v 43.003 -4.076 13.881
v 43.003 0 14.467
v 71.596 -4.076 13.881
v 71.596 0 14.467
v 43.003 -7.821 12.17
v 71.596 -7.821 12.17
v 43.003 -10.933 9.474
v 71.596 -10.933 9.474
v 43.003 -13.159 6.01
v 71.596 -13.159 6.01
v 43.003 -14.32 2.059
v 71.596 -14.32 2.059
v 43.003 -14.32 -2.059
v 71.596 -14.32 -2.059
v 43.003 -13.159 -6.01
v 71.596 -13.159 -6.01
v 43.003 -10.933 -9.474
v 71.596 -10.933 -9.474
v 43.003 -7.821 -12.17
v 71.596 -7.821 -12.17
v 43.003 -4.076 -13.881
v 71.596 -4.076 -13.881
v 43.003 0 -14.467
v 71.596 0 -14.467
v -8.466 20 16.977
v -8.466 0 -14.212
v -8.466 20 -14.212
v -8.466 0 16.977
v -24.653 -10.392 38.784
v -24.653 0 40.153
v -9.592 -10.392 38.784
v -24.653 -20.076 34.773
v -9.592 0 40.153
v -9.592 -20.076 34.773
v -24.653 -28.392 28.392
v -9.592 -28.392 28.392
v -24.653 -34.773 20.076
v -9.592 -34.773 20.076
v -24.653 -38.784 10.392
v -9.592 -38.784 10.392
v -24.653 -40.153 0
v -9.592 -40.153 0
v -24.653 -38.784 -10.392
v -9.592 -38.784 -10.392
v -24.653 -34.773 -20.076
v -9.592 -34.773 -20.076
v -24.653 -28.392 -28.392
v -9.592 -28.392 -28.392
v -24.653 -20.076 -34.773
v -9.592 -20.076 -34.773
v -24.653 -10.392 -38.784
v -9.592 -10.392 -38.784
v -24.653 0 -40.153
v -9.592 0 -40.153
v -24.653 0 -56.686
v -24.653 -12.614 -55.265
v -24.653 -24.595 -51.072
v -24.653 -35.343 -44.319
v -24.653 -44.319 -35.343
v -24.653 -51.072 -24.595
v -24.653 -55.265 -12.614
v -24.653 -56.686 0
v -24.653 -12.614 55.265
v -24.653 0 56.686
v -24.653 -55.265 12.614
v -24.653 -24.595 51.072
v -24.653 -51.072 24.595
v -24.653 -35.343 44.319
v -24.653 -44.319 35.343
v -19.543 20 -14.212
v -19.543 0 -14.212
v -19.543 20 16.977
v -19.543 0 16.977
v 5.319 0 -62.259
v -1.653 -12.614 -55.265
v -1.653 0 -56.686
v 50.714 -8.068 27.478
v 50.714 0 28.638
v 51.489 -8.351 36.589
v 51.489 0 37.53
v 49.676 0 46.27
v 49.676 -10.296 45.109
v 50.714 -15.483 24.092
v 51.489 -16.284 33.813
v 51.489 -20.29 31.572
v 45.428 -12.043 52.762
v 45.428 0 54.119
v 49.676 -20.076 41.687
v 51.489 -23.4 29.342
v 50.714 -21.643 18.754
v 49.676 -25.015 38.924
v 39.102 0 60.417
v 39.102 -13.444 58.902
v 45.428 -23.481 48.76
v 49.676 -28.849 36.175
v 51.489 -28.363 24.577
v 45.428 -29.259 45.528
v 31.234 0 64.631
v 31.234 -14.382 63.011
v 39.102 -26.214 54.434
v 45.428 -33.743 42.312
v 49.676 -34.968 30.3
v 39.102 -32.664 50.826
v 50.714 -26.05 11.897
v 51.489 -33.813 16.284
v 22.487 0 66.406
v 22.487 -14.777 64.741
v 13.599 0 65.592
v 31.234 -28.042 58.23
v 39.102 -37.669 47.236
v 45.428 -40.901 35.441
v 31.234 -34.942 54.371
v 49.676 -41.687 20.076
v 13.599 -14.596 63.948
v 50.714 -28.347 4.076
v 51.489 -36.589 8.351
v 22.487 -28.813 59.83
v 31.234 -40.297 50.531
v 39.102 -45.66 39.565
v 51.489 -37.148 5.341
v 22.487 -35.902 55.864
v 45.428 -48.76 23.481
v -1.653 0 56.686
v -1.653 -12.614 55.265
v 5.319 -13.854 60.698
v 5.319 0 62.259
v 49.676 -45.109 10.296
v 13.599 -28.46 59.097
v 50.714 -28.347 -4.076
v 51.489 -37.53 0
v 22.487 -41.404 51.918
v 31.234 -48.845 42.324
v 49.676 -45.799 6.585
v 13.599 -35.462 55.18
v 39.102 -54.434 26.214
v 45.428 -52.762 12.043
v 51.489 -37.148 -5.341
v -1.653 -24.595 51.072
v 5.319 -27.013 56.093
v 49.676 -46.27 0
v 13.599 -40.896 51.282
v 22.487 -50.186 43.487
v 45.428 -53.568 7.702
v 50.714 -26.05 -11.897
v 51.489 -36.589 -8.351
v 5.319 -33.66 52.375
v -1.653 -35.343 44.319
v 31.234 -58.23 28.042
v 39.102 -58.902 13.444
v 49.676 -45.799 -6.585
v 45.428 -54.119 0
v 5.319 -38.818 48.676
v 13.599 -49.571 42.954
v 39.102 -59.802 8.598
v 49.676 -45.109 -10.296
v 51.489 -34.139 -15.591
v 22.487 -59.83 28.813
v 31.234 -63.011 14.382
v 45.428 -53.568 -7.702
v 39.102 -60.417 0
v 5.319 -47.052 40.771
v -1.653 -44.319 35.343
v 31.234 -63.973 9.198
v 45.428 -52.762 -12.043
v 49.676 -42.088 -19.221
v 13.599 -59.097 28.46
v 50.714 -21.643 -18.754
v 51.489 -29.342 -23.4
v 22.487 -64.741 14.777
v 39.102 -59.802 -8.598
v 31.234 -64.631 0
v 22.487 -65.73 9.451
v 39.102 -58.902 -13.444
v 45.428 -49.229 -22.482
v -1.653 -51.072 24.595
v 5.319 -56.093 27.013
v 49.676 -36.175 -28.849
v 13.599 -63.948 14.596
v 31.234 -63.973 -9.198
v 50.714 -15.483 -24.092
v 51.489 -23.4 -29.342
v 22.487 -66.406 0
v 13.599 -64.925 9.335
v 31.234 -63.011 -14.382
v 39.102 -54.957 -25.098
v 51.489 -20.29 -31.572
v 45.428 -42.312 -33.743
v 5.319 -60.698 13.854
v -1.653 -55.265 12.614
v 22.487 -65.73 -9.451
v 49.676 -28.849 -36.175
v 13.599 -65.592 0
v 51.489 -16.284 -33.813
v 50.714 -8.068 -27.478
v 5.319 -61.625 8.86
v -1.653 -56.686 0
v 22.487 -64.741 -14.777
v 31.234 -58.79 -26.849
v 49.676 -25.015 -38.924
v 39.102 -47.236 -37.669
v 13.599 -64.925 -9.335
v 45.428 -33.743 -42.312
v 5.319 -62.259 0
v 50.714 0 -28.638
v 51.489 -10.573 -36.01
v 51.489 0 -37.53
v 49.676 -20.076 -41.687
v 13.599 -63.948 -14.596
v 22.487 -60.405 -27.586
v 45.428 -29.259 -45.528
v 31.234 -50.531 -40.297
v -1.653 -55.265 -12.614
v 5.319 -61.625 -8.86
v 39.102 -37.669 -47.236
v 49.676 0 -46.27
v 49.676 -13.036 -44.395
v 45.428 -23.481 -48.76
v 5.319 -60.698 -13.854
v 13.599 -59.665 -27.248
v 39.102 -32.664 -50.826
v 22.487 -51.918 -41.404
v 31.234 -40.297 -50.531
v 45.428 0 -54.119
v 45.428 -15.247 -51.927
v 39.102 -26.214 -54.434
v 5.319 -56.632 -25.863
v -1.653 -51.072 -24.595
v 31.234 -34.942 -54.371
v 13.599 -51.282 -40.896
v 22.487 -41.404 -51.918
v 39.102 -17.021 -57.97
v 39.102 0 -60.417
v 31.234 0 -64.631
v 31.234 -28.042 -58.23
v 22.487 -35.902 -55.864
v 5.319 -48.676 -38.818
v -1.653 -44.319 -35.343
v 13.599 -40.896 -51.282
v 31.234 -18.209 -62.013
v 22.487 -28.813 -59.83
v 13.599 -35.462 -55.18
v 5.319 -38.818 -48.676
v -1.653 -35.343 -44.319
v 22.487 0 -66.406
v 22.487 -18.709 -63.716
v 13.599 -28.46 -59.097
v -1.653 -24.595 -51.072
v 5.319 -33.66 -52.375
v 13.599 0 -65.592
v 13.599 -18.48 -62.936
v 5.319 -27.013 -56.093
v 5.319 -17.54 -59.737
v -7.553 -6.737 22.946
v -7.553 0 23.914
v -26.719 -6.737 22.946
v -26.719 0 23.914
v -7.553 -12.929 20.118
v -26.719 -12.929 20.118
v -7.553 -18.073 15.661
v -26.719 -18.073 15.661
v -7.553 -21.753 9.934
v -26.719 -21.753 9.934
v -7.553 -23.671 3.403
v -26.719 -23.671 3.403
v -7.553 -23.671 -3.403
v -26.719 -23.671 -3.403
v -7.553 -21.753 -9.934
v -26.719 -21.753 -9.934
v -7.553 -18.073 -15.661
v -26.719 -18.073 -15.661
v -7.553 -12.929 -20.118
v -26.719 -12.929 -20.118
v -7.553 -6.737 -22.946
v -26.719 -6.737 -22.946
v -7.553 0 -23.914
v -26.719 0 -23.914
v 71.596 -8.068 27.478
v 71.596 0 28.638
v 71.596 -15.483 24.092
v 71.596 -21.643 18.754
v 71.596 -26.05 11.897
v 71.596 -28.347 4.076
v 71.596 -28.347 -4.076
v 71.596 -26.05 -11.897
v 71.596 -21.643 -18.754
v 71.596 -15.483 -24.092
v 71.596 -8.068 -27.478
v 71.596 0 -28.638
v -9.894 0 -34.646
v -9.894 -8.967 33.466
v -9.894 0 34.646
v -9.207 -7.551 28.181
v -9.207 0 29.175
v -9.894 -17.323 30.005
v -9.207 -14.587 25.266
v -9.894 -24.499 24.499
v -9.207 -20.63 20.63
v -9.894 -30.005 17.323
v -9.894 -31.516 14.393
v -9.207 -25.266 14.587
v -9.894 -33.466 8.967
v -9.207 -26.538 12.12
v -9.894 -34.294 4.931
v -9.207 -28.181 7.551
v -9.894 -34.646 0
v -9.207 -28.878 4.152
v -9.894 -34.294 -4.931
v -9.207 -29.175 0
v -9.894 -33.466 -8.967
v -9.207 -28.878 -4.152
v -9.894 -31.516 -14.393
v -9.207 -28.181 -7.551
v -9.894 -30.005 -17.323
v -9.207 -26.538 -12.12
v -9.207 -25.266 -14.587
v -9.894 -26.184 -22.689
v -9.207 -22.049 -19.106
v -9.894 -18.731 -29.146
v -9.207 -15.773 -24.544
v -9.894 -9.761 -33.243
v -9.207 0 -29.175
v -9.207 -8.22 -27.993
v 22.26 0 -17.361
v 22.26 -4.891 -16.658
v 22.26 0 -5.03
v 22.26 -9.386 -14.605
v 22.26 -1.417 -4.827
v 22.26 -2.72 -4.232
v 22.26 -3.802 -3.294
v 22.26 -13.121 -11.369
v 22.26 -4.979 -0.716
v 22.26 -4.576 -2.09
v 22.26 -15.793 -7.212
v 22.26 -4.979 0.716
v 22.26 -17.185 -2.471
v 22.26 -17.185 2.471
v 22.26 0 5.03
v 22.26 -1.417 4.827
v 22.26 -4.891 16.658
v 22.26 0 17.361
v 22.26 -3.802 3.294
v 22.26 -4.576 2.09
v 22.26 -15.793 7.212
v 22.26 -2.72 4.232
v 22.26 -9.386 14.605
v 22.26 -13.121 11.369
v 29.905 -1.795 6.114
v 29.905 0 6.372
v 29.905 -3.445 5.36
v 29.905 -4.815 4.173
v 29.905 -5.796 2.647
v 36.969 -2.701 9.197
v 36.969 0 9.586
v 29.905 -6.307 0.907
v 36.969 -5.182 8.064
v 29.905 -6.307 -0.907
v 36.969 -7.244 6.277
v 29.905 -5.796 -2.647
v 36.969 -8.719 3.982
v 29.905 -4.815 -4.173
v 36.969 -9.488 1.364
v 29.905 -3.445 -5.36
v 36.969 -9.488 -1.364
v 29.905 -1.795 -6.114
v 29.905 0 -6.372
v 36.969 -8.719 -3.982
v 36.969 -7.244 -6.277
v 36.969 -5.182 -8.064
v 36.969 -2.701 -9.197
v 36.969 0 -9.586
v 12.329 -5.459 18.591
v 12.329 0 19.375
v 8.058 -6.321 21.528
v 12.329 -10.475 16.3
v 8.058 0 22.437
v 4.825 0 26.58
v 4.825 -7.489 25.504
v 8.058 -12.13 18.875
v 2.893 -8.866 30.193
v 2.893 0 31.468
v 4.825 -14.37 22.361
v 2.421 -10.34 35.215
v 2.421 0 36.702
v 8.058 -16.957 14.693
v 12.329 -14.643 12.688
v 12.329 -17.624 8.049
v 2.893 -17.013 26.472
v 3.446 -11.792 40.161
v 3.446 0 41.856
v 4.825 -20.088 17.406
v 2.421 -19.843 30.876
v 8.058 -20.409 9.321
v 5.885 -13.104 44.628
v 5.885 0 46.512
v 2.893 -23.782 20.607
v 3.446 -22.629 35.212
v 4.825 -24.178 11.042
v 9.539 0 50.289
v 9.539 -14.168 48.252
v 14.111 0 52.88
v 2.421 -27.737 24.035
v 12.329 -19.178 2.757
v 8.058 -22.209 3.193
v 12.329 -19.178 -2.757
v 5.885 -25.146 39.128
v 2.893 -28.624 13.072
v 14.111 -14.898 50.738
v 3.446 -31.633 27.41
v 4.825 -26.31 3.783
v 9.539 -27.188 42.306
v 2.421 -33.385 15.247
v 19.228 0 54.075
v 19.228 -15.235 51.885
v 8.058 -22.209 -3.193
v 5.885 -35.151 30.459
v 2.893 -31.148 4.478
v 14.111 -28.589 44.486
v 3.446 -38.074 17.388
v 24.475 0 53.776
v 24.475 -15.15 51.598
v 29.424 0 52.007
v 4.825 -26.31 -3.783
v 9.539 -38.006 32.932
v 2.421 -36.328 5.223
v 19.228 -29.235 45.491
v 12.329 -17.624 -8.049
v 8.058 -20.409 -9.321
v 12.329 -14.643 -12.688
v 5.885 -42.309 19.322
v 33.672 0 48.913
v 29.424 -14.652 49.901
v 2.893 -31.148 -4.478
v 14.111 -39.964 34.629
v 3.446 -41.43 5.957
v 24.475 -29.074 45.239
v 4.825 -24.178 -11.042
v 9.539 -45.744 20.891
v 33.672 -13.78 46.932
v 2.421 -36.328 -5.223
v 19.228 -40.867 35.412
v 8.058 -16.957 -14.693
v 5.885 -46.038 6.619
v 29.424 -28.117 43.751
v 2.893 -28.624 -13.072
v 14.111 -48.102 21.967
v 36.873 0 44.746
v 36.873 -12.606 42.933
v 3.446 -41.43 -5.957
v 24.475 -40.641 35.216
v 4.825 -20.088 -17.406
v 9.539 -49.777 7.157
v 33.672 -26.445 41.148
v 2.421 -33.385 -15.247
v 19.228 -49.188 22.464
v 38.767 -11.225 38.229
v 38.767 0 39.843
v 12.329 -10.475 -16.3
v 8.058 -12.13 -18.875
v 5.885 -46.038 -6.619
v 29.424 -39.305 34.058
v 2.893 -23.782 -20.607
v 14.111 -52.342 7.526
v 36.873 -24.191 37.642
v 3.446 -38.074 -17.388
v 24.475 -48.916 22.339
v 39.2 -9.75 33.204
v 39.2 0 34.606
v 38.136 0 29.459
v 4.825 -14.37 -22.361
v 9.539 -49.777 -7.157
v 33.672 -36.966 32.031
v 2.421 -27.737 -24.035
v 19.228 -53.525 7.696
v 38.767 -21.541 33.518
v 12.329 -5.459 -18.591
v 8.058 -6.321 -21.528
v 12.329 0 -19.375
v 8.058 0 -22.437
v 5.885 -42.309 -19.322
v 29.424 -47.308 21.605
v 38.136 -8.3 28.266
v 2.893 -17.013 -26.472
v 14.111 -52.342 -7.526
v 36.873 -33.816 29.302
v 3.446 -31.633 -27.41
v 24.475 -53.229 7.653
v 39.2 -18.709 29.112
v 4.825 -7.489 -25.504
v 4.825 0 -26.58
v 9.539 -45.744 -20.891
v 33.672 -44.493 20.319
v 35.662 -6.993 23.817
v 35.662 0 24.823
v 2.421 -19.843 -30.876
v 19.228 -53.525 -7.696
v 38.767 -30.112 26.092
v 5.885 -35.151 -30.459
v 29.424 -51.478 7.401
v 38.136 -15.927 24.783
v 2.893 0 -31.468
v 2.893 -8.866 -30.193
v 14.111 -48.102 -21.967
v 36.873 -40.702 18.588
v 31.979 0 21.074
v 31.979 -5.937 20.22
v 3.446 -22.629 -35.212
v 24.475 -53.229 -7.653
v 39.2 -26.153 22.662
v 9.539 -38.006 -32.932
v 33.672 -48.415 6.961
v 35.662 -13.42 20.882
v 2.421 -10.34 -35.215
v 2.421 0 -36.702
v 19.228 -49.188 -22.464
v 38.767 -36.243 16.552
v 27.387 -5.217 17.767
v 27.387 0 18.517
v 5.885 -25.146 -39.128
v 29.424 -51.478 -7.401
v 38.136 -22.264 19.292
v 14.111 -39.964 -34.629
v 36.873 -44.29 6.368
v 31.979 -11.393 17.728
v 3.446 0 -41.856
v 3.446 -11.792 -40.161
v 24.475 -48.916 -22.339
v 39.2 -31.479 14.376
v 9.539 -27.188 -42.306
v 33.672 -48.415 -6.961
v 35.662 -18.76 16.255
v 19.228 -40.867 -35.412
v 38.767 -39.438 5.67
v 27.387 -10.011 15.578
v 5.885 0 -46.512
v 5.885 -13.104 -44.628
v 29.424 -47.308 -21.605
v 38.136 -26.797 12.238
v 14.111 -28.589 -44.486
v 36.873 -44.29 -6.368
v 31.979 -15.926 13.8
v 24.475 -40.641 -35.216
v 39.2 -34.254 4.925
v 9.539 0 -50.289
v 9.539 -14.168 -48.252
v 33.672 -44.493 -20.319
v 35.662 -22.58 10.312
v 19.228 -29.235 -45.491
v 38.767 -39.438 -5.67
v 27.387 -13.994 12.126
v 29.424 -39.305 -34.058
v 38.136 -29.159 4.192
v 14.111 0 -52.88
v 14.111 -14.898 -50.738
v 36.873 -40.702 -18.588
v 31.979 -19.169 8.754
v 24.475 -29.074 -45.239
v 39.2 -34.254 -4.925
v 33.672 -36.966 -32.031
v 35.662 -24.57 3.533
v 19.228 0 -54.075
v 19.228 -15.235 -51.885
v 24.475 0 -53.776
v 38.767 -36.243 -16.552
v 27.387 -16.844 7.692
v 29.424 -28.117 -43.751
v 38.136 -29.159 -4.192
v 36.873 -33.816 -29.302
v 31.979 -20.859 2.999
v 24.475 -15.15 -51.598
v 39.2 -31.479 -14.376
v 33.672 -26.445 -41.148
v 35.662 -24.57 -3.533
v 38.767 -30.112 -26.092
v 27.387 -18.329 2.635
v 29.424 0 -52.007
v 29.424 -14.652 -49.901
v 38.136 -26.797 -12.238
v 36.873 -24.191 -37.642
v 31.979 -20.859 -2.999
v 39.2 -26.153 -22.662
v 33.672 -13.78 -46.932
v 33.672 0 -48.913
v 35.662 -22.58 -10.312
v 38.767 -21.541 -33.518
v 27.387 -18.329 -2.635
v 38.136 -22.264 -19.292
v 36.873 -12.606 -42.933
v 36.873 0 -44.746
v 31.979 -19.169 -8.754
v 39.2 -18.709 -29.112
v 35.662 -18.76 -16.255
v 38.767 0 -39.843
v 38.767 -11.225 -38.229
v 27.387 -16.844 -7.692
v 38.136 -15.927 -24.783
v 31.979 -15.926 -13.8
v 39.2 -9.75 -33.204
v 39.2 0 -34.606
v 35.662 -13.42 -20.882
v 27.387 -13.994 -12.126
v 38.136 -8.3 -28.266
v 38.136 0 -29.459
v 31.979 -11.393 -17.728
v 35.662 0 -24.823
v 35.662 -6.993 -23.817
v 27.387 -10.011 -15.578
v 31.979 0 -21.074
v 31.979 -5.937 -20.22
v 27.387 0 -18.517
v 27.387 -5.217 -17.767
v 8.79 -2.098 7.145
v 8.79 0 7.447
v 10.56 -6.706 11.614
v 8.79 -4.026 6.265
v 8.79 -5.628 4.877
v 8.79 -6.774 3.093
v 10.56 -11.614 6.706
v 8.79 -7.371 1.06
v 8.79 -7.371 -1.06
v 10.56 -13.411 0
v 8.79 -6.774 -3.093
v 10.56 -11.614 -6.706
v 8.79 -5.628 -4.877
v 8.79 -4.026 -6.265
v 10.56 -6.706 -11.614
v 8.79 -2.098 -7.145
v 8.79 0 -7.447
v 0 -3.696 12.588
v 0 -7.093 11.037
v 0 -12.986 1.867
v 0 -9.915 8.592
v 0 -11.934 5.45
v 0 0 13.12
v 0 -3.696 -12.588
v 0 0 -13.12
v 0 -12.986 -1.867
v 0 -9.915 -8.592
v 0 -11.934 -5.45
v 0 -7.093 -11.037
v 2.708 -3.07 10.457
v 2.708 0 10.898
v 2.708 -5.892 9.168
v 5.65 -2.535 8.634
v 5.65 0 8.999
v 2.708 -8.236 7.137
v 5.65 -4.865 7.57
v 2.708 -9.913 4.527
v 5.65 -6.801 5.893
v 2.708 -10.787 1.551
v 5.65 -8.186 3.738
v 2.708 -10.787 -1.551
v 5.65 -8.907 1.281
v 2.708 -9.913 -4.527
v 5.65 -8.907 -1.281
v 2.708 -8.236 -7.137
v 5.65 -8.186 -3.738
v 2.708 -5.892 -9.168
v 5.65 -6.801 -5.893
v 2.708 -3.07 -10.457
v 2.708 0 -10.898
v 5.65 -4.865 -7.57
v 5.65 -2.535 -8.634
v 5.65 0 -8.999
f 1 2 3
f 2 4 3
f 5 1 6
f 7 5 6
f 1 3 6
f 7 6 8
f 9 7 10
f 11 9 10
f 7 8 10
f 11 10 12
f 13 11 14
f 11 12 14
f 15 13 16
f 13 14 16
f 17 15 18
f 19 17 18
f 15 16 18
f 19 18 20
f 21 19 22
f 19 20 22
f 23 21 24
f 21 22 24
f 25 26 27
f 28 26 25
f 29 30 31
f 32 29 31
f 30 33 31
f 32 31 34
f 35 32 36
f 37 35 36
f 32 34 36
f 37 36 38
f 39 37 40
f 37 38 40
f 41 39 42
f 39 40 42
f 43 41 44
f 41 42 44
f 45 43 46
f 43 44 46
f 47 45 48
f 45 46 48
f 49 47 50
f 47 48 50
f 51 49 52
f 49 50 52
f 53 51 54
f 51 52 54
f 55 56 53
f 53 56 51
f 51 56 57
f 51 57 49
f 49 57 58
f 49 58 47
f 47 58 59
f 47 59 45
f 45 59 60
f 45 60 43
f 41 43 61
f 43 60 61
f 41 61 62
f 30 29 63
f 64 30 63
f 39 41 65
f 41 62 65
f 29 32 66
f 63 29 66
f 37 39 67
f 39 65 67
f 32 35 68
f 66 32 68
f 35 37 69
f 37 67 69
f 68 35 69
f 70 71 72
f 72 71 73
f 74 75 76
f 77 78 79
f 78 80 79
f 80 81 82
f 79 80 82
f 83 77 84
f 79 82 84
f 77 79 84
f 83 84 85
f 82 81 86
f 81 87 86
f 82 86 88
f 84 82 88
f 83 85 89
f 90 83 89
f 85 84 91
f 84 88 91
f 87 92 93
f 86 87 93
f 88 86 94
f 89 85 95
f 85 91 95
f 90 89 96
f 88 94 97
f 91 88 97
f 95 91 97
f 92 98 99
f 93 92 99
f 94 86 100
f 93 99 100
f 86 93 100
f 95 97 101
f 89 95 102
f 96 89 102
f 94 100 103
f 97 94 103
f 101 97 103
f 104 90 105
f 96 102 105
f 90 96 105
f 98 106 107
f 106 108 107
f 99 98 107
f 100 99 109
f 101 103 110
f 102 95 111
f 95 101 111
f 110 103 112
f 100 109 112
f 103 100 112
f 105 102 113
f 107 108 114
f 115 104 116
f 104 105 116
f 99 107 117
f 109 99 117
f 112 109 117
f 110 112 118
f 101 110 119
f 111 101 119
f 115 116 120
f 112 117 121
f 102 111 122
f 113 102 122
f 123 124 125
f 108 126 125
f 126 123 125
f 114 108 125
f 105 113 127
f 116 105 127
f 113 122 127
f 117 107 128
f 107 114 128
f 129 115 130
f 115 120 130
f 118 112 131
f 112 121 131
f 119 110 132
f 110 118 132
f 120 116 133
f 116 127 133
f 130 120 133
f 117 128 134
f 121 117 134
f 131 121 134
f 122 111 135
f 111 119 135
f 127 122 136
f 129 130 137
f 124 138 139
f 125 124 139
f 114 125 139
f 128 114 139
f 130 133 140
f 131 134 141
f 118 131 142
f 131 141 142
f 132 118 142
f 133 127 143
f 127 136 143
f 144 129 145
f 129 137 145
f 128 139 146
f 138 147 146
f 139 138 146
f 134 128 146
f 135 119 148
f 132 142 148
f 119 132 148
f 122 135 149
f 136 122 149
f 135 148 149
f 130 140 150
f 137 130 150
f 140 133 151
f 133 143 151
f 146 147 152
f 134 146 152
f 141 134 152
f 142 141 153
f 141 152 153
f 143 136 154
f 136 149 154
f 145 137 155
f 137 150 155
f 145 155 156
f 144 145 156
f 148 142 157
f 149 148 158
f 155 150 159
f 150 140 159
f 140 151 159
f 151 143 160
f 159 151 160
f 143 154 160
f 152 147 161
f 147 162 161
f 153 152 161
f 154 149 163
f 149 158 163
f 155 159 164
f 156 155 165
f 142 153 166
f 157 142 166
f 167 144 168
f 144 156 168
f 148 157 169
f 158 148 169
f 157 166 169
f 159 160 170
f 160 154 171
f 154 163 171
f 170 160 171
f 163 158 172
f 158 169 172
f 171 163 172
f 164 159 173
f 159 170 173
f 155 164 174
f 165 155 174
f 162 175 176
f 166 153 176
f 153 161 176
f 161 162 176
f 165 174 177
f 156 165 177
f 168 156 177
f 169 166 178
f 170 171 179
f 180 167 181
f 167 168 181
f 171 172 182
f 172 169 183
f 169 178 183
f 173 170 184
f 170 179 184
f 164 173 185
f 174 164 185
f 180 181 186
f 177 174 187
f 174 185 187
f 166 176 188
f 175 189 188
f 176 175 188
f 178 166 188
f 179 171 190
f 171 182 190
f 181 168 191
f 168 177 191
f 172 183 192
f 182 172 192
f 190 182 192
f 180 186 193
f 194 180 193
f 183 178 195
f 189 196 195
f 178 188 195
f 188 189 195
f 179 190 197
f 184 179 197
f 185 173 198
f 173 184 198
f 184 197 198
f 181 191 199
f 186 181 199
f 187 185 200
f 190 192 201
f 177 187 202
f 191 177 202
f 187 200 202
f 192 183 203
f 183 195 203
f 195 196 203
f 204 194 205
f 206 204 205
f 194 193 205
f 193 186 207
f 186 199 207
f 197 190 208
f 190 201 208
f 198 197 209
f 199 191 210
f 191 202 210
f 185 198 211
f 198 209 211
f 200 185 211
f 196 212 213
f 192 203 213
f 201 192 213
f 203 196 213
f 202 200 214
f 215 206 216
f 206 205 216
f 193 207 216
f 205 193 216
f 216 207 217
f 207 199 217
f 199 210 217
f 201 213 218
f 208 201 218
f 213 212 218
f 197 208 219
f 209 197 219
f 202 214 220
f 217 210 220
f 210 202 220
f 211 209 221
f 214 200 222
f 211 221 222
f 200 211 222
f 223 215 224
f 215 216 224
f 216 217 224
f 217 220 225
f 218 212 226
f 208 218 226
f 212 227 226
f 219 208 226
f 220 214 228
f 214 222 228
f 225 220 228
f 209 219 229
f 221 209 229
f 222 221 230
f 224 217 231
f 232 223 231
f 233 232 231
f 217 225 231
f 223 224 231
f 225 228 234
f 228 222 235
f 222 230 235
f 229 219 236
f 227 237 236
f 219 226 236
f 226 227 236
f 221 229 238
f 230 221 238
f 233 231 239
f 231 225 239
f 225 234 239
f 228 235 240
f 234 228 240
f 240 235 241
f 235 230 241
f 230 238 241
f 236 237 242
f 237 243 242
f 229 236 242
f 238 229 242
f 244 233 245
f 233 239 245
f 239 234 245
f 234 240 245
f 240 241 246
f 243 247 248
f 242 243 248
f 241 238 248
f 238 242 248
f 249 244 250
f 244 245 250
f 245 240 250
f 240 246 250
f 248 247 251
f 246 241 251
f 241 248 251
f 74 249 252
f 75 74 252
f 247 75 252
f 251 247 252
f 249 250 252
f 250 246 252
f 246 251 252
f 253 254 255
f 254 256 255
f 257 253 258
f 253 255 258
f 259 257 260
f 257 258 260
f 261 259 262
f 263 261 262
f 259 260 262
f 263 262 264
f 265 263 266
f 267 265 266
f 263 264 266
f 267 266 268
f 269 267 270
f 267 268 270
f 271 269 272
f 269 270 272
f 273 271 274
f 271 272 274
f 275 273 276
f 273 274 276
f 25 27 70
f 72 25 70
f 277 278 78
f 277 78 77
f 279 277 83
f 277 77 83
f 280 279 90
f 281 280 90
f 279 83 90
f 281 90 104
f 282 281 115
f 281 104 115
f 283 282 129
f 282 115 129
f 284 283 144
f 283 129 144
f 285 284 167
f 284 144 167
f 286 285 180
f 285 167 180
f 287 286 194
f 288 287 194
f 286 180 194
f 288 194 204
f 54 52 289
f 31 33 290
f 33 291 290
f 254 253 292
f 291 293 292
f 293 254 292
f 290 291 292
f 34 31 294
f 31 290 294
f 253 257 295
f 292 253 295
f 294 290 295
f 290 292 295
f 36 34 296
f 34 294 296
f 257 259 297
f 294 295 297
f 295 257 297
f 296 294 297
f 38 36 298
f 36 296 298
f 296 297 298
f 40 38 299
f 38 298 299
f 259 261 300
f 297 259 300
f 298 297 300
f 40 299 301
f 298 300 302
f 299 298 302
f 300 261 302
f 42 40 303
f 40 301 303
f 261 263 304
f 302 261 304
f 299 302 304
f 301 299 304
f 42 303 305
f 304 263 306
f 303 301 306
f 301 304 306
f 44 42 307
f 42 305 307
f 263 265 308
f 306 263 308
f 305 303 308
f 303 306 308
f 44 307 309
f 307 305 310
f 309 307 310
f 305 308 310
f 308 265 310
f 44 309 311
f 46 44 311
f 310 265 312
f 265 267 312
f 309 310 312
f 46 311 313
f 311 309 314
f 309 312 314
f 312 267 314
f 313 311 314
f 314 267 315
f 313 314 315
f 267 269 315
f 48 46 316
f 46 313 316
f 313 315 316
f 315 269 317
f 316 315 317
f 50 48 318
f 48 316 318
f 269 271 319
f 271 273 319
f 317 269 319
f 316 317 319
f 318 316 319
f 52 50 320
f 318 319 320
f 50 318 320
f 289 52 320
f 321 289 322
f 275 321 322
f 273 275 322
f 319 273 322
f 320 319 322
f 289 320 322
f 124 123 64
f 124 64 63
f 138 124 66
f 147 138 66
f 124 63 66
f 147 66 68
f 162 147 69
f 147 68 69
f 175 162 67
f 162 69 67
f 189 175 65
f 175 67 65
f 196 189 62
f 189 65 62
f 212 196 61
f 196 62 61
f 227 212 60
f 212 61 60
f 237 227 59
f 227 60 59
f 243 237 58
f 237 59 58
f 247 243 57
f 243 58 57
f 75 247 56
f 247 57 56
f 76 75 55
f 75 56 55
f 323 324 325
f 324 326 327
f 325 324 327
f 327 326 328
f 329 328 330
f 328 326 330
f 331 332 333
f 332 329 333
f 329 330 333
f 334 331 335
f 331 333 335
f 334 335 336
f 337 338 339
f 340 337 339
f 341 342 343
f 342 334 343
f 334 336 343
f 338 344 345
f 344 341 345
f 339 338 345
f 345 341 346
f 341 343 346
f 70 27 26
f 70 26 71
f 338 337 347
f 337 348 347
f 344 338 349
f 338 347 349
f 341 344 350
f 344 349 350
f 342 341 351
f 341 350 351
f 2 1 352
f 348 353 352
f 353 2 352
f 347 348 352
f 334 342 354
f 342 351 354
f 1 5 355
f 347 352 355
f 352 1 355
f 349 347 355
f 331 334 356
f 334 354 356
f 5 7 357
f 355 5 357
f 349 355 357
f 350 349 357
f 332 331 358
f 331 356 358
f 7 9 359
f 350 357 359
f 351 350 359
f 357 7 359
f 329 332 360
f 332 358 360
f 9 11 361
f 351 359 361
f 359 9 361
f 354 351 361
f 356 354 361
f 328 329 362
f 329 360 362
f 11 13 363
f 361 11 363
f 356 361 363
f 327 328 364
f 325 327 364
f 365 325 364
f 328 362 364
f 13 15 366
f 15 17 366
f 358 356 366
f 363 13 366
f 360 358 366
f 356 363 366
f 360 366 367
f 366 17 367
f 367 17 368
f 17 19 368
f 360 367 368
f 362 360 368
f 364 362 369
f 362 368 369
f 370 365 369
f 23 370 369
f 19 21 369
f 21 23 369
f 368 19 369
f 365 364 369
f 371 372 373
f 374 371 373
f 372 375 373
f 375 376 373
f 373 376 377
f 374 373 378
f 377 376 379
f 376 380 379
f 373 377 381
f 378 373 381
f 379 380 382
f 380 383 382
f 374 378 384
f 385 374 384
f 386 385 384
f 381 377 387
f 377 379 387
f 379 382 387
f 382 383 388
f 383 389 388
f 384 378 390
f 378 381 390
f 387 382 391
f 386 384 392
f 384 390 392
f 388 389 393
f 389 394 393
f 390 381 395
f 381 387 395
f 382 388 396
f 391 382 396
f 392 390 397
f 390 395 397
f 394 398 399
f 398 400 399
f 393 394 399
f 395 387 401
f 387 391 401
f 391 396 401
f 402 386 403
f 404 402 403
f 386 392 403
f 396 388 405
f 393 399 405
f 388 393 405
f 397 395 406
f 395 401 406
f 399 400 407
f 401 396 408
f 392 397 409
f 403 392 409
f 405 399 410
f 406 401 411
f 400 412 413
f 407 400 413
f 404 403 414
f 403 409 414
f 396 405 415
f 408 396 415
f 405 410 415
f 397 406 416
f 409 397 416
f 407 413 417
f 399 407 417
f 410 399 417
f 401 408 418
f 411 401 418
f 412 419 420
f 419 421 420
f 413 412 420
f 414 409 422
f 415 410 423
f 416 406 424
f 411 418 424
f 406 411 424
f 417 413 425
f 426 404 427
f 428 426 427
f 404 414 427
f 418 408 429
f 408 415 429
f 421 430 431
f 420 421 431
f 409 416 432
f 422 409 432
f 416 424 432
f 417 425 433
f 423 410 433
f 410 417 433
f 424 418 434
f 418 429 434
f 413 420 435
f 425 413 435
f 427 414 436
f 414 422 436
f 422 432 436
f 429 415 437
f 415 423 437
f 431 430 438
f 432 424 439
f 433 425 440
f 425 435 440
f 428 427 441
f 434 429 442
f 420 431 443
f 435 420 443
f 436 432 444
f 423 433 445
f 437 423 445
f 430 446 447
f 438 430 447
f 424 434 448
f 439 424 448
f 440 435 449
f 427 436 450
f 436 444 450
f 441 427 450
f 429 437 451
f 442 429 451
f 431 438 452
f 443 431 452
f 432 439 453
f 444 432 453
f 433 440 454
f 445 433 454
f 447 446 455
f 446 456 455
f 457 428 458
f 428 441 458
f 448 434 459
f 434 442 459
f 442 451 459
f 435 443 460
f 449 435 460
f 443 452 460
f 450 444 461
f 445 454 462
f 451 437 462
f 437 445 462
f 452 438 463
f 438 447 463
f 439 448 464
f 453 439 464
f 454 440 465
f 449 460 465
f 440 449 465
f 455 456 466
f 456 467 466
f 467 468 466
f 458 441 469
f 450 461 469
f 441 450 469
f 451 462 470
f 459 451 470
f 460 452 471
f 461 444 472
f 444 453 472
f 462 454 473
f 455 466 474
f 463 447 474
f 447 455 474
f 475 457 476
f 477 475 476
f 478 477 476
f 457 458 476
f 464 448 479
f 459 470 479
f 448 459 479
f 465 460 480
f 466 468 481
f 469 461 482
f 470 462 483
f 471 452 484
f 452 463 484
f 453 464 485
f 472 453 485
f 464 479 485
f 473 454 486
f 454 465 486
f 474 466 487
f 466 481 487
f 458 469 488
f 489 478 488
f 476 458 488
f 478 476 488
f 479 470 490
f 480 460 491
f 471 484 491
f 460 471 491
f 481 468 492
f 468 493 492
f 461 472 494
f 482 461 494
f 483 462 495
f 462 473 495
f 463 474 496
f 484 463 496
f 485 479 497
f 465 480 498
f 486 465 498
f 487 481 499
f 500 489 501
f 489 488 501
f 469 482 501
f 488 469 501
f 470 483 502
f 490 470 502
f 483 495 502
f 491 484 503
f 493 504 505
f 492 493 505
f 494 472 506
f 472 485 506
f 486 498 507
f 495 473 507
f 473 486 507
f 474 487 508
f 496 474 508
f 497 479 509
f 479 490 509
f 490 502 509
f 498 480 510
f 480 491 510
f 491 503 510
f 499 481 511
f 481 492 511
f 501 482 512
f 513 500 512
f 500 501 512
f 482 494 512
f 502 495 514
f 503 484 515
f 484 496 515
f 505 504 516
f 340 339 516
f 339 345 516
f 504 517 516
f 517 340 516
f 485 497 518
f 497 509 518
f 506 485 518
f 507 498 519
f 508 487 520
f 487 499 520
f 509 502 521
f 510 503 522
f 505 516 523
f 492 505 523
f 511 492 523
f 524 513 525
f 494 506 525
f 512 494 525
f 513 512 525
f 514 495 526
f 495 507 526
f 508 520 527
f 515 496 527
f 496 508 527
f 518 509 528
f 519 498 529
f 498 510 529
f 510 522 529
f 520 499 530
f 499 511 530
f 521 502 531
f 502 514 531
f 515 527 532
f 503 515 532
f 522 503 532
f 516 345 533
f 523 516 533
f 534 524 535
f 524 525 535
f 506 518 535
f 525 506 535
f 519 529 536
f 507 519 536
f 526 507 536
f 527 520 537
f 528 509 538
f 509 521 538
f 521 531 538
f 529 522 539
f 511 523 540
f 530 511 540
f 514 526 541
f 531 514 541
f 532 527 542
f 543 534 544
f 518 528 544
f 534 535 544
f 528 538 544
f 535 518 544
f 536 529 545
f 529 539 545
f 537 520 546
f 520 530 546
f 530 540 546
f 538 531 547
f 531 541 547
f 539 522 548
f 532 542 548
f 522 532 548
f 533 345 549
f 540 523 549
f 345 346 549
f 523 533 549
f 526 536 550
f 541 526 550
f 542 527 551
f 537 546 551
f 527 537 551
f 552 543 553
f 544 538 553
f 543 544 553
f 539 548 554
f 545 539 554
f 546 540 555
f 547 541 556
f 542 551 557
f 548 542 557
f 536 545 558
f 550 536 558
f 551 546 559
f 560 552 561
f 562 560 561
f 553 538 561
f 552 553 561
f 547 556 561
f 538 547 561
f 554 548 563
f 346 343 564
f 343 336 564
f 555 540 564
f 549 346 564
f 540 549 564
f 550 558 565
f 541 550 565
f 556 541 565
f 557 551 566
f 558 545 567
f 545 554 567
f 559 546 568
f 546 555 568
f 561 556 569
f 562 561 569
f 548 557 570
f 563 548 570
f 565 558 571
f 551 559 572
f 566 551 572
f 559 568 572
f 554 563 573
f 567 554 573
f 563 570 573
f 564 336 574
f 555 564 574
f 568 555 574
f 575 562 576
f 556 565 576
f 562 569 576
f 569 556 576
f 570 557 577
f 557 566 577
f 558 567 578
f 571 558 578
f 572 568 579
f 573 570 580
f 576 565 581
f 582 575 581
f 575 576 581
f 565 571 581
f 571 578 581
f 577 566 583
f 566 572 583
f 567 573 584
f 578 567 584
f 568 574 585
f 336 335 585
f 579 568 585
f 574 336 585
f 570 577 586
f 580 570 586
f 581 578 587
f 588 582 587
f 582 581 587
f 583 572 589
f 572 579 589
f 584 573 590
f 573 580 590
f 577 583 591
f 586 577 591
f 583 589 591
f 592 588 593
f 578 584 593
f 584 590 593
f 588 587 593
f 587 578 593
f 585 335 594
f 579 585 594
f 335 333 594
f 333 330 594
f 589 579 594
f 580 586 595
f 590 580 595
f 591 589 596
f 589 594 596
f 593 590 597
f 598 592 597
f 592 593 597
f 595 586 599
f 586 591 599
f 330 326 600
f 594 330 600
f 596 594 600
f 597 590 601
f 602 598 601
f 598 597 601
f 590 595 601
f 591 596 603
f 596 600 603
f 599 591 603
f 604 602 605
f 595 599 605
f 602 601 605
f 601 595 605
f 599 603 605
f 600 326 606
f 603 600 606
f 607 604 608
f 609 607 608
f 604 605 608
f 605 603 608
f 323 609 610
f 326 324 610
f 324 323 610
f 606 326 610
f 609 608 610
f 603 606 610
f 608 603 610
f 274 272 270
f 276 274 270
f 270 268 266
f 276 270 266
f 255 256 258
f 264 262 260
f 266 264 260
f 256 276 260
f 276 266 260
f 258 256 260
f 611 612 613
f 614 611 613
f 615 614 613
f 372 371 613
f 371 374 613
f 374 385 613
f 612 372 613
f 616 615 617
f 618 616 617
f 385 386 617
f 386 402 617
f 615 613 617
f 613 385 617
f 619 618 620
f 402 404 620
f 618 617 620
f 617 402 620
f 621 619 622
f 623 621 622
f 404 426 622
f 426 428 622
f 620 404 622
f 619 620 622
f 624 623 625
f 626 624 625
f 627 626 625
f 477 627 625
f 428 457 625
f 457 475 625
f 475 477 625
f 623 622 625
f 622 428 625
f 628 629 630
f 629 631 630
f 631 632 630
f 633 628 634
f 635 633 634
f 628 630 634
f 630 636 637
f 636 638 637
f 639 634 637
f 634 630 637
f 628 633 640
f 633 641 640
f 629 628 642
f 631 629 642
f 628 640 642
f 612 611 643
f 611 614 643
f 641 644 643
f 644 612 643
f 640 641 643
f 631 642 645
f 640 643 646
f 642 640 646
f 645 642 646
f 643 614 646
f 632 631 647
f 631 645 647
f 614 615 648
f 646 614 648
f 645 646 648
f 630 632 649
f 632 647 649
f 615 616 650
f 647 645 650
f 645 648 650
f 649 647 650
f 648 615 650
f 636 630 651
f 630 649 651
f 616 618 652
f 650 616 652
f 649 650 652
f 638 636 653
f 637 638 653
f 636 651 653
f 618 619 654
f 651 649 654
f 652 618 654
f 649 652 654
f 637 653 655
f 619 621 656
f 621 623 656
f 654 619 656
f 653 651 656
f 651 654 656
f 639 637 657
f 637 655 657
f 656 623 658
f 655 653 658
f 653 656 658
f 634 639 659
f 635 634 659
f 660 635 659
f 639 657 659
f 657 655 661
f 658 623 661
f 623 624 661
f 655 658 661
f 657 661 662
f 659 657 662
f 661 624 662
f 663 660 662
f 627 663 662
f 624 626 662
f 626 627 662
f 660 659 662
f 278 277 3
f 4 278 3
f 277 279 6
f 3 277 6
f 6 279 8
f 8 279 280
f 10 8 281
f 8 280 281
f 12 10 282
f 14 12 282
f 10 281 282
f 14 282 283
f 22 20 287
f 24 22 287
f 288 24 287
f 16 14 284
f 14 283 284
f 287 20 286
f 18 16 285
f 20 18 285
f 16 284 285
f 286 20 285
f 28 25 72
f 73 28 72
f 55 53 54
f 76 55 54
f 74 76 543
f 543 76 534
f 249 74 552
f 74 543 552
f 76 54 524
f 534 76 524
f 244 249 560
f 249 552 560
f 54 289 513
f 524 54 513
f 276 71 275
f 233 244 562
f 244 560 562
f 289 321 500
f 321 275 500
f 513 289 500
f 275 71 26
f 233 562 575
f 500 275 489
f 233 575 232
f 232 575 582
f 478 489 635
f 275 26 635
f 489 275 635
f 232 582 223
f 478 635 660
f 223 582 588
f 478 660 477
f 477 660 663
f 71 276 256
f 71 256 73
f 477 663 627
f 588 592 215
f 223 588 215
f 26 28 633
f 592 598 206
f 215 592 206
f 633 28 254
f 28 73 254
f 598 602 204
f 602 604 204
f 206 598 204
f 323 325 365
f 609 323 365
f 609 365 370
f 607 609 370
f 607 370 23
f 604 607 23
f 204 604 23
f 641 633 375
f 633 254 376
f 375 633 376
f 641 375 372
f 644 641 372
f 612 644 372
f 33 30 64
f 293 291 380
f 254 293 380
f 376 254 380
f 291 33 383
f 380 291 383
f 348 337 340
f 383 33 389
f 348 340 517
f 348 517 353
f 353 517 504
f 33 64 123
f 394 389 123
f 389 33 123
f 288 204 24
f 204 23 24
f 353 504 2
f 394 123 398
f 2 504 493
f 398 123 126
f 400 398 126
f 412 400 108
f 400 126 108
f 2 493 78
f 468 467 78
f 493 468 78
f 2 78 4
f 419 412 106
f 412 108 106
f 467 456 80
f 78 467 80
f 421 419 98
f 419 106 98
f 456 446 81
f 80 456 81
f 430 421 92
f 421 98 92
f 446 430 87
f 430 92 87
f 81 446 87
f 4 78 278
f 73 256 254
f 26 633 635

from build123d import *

# Parameters (mm, degrees)
F1_ANGLE = 180
F2_W     = 11.076235
F2_H     = 31.188723
F3_DEPTH = 20


with BuildPart() as f1:
    # F0 (on Front) → F1 (revolve)
    with BuildSketch(Plane.XZ):
        with BuildLine():
            Line((-24.65253, 40.152624), (-9.592434, 40.152624))
            ThreePointArc((-9.592434, 40.152624), (-9.673772, 31.895267), (-7.553213, 23.914428))
            Line((-7.553213, 23.914428), (-26.719207, 23.914428))
            Line((-26.719207, 23.914428), (-26.719207, 0))
            Line((-26.719207, 0), (0, 0))
            Line((0, 0), (0, 13.119846))
            ThreePointArc((0, 13.119846), (4.151934, 9.906387), (8.790316, 7.446654))
            Line((8.790316, 7.446654), (12.329266, 19.375385))
            ThreePointArc((12.329266, 19.375385), (24.475215, 53.77601), (22.260371, 17.361432))
            Line((22.260371, 17.361432), (22.260371, 5.030416))
            ThreePointArc((22.260371, 5.030416), (33.538586, 7.754689), (43.002622, 14.466753))
            Line((43.002622, 14.466753), (71.595661, 14.466753))
            Line((71.595661, 14.466753), (71.595661, 28.638268))
            Line((71.595661, 28.638268), (50.713915, 28.638268))
            ThreePointArc((50.713915, 28.638268), (35.322294, 62.811102), (-1.652945, 56.686051))
            Line((-1.652945, 56.686051), (-24.65253, 56.686051))
            Line((-24.65253, 56.686051), (-24.65253, 40.152624))
        make_face()
    revolve(axis=Axis((-13.359603, 0, 0), (1, 0, 0)), revolution_arc=F1_ANGLE)

    # F2 (on face) → F3 (join)
    with BuildSketch(Plane(origin=(0, 0, 0), x_dir=(-1, 0, 0), z_dir=(0, 1, 0))):
        with Locations((14.0045, 1.382739)):
            Rectangle(F2_W, F2_H)
    extrude(amount=F3_DEPTH)


solid = f1.part
